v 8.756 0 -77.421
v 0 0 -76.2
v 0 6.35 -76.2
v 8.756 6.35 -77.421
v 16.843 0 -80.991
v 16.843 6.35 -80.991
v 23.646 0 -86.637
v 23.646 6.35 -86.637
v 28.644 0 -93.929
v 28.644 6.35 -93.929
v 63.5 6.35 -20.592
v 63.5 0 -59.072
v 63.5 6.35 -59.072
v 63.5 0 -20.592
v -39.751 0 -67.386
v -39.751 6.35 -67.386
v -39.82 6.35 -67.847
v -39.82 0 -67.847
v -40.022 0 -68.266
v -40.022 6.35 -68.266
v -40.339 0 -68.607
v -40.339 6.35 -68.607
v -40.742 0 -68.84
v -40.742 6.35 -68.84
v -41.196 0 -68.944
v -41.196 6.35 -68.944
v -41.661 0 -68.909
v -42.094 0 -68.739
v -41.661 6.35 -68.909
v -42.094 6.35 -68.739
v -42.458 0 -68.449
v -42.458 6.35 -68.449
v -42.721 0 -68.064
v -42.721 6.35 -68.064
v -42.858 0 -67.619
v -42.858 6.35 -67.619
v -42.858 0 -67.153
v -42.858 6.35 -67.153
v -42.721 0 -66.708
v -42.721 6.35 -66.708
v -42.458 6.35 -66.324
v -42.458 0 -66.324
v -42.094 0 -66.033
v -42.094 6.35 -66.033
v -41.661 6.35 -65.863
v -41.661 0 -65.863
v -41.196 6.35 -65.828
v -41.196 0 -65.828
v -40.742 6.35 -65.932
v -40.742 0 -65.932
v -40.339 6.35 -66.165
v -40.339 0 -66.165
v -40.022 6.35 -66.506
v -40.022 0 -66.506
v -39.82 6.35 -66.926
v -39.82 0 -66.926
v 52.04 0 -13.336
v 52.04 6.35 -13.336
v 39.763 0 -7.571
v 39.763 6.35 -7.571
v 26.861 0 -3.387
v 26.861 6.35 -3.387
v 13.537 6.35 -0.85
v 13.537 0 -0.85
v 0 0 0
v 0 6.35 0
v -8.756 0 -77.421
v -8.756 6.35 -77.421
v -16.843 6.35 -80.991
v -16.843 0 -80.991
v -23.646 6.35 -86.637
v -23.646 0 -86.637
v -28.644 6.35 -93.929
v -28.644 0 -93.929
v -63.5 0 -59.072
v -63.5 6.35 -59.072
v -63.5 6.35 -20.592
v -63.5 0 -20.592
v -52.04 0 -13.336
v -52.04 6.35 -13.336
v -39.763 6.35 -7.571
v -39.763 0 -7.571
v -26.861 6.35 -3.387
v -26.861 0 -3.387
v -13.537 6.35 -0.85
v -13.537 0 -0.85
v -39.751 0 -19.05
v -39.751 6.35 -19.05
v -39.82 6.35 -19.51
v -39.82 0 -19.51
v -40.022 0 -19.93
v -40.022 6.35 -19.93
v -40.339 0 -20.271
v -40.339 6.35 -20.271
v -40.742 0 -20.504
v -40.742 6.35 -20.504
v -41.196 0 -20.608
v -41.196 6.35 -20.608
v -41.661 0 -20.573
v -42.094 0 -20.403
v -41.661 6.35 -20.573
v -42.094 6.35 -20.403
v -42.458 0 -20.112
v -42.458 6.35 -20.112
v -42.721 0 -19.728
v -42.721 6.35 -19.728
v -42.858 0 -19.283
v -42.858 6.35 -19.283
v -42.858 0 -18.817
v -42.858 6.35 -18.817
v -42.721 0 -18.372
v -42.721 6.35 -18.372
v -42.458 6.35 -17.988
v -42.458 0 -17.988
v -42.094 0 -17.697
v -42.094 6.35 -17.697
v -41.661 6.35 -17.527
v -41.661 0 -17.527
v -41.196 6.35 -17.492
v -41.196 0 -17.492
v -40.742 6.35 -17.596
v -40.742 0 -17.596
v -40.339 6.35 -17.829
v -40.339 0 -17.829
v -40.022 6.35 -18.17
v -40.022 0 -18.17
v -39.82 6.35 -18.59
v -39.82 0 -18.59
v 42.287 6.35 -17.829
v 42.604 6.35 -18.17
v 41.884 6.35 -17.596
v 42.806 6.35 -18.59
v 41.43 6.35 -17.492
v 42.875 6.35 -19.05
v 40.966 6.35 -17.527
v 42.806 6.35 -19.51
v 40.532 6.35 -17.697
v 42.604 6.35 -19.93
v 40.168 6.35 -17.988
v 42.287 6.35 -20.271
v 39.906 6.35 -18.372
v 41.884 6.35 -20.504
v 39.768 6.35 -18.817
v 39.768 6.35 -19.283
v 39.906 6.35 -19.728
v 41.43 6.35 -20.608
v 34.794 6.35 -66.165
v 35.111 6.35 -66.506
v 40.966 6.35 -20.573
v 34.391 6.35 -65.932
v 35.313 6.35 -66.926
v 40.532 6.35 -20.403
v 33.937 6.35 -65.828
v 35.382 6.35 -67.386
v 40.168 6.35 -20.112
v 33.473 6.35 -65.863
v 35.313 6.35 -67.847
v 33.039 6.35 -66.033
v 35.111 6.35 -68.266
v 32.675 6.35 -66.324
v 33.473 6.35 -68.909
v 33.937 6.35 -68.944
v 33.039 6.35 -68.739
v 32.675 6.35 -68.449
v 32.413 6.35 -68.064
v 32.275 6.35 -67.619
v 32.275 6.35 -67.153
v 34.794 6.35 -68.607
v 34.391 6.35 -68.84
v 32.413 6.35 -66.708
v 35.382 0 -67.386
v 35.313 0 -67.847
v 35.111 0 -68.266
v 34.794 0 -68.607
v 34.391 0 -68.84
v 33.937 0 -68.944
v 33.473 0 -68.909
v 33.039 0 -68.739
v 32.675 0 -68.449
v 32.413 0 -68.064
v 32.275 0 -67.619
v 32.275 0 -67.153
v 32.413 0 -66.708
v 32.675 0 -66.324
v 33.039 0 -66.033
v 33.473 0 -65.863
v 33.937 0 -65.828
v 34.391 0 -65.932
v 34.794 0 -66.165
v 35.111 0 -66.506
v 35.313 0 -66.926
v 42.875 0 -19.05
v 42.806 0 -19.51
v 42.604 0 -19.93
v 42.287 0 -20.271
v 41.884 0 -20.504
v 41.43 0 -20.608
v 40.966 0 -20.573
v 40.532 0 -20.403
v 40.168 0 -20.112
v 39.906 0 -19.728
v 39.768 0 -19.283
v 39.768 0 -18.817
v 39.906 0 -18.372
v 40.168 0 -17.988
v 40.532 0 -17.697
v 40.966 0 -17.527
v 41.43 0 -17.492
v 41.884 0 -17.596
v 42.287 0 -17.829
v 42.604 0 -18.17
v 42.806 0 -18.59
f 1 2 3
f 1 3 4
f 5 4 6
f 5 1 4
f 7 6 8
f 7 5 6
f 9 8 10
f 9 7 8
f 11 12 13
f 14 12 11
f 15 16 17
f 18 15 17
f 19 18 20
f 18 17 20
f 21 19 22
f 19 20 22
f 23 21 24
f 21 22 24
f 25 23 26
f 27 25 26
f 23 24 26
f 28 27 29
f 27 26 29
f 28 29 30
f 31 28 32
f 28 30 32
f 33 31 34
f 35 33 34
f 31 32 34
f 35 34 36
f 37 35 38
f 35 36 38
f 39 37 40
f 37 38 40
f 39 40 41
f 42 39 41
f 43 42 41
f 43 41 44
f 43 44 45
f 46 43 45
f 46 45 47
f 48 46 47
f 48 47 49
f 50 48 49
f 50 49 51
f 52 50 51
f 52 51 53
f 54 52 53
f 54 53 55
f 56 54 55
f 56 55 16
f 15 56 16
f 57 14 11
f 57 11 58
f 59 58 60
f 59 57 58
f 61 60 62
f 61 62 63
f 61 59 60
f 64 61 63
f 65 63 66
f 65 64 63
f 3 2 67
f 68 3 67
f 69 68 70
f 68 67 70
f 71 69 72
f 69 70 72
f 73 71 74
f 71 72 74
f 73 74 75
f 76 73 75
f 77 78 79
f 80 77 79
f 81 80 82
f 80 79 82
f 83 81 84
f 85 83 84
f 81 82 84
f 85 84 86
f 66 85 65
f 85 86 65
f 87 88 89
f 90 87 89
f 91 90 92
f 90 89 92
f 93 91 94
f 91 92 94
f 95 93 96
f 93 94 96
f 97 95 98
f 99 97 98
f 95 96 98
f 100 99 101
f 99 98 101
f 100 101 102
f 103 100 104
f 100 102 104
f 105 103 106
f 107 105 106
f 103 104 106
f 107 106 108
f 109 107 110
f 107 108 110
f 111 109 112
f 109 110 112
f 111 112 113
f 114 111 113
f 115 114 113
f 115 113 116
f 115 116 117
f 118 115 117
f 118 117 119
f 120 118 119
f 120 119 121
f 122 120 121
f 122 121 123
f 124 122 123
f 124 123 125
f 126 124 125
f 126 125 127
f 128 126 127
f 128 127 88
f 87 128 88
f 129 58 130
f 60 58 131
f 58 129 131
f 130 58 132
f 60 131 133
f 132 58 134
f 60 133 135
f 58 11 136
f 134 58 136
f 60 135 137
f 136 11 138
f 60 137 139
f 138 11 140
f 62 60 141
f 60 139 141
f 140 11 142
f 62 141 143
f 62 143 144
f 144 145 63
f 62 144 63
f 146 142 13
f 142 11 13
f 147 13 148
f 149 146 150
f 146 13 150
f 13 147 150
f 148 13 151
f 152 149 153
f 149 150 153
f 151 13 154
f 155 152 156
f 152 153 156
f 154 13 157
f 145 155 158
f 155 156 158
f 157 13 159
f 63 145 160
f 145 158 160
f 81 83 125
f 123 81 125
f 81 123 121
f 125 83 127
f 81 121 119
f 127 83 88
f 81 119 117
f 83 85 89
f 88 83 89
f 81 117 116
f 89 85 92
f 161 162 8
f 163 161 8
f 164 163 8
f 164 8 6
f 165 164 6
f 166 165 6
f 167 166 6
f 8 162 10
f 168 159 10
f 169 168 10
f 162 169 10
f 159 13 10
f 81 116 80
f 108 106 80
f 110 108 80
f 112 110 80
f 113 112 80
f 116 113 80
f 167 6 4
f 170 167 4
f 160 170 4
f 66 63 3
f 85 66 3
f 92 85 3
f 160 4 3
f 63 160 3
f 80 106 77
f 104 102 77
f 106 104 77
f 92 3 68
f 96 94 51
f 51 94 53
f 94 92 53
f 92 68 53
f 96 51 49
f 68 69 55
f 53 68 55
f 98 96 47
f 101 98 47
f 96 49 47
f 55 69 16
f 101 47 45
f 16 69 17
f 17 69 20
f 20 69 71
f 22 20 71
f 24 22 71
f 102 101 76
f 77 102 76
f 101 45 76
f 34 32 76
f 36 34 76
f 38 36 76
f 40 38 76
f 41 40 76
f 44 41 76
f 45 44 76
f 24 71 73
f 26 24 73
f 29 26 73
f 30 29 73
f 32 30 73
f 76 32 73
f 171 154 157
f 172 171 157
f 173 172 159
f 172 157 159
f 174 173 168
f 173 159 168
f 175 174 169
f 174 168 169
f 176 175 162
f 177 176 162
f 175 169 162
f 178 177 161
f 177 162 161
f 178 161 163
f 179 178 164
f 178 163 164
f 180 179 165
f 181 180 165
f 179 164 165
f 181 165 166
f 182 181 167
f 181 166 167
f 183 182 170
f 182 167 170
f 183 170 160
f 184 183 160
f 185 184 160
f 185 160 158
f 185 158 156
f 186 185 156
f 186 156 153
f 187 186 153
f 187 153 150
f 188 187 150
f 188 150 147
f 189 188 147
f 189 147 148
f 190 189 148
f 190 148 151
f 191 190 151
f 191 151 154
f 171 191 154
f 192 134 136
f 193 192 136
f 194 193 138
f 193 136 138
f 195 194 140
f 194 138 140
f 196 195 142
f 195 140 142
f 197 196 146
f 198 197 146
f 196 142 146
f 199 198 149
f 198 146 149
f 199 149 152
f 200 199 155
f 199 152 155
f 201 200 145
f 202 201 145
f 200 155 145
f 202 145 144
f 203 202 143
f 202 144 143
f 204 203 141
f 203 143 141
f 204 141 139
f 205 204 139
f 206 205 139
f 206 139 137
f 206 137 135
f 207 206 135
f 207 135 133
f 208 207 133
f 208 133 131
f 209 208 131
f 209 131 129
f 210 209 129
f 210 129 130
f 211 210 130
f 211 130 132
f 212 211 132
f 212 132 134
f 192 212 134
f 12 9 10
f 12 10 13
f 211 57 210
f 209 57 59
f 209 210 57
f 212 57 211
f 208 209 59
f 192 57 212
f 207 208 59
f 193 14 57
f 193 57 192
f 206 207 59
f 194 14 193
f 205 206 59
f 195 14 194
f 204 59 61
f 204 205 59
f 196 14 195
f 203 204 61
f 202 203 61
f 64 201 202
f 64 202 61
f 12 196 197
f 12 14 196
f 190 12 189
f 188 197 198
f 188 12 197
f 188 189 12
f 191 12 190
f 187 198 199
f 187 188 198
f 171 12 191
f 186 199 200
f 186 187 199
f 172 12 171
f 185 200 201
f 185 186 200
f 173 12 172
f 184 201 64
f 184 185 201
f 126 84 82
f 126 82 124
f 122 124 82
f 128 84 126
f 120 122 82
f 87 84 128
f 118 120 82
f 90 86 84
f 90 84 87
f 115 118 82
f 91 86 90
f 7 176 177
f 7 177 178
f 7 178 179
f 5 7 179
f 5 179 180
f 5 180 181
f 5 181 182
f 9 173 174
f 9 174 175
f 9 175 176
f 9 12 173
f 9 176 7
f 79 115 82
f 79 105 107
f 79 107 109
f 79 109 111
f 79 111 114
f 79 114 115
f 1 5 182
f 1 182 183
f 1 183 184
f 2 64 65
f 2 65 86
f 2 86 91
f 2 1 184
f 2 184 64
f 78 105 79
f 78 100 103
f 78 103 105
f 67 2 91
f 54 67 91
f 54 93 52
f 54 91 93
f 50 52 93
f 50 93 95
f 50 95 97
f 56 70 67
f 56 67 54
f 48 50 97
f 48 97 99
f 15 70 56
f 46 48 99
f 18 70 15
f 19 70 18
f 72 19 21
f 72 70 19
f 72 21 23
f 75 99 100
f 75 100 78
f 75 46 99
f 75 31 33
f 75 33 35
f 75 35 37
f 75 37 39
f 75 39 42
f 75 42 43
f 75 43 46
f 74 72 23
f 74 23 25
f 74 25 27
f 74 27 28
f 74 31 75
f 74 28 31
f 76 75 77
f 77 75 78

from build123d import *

# Parameters (mm, degrees)
BOSS_EXTRUDE1_DEPTH = 6.35
SKETCH3_R           = 1.5621
CUT_EXTRUDE1_DEPTH  = 7.35


with BuildPart() as part:
    # Sketch1 → Boss-Extrude1 (new body)
    with BuildSketch(Plane(origin=(0, 0, 0), x_dir=(1, 0, 0), z_dir=(0, 1, 0))):
        with BuildLine():
            Line((-63.5, 59.072409794), (-63.5, 20.592039538))
            ThreePointArc((-63.5, 20.592039538), (-33.377694994, 5.276670816), (0, 0))
            Line((0, 0), (0, 76.2))
            ThreePointArc((0, 76.2), (-16.843183971, 80.990709686), (-28.643822974, 93.92858682))
            Line((-28.643822974, 93.92858682), (-63.5, 59.072409794))
        make_face()
    boss_extrude1 = extrude(amount=BOSS_EXTRUDE1_DEPTH)

    # Mirror1: Boss-Extrude1 across plane
    add(boss_extrude1.mirror(Plane(origin=(0, 0, 0), x_dir=(0, 0, 1), z_dir=(1, 0, 0))))

    # Sketch3 → Cut-Extrude1 (cut, through all)
    with BuildSketch(Plane(origin=(0, 6.35, 0), x_dir=(1, 0, 0), z_dir=(0, 1, 0))):
        with Locations((-41.3131, 19.05)):
            Circle(SKETCH3_R)
        with Locations((41.3131, 19.05)):
            Circle(SKETCH3_R)
        with Locations((-41.3131, 67.3862)):
            Circle(SKETCH3_R)
        with Locations((33.8201, 67.3862)):
            Circle(SKETCH3_R)
    extrude(amount=-CUT_EXTRUDE1_DEPTH, mode=Mode.SUBTRACT)


solid = part.part
